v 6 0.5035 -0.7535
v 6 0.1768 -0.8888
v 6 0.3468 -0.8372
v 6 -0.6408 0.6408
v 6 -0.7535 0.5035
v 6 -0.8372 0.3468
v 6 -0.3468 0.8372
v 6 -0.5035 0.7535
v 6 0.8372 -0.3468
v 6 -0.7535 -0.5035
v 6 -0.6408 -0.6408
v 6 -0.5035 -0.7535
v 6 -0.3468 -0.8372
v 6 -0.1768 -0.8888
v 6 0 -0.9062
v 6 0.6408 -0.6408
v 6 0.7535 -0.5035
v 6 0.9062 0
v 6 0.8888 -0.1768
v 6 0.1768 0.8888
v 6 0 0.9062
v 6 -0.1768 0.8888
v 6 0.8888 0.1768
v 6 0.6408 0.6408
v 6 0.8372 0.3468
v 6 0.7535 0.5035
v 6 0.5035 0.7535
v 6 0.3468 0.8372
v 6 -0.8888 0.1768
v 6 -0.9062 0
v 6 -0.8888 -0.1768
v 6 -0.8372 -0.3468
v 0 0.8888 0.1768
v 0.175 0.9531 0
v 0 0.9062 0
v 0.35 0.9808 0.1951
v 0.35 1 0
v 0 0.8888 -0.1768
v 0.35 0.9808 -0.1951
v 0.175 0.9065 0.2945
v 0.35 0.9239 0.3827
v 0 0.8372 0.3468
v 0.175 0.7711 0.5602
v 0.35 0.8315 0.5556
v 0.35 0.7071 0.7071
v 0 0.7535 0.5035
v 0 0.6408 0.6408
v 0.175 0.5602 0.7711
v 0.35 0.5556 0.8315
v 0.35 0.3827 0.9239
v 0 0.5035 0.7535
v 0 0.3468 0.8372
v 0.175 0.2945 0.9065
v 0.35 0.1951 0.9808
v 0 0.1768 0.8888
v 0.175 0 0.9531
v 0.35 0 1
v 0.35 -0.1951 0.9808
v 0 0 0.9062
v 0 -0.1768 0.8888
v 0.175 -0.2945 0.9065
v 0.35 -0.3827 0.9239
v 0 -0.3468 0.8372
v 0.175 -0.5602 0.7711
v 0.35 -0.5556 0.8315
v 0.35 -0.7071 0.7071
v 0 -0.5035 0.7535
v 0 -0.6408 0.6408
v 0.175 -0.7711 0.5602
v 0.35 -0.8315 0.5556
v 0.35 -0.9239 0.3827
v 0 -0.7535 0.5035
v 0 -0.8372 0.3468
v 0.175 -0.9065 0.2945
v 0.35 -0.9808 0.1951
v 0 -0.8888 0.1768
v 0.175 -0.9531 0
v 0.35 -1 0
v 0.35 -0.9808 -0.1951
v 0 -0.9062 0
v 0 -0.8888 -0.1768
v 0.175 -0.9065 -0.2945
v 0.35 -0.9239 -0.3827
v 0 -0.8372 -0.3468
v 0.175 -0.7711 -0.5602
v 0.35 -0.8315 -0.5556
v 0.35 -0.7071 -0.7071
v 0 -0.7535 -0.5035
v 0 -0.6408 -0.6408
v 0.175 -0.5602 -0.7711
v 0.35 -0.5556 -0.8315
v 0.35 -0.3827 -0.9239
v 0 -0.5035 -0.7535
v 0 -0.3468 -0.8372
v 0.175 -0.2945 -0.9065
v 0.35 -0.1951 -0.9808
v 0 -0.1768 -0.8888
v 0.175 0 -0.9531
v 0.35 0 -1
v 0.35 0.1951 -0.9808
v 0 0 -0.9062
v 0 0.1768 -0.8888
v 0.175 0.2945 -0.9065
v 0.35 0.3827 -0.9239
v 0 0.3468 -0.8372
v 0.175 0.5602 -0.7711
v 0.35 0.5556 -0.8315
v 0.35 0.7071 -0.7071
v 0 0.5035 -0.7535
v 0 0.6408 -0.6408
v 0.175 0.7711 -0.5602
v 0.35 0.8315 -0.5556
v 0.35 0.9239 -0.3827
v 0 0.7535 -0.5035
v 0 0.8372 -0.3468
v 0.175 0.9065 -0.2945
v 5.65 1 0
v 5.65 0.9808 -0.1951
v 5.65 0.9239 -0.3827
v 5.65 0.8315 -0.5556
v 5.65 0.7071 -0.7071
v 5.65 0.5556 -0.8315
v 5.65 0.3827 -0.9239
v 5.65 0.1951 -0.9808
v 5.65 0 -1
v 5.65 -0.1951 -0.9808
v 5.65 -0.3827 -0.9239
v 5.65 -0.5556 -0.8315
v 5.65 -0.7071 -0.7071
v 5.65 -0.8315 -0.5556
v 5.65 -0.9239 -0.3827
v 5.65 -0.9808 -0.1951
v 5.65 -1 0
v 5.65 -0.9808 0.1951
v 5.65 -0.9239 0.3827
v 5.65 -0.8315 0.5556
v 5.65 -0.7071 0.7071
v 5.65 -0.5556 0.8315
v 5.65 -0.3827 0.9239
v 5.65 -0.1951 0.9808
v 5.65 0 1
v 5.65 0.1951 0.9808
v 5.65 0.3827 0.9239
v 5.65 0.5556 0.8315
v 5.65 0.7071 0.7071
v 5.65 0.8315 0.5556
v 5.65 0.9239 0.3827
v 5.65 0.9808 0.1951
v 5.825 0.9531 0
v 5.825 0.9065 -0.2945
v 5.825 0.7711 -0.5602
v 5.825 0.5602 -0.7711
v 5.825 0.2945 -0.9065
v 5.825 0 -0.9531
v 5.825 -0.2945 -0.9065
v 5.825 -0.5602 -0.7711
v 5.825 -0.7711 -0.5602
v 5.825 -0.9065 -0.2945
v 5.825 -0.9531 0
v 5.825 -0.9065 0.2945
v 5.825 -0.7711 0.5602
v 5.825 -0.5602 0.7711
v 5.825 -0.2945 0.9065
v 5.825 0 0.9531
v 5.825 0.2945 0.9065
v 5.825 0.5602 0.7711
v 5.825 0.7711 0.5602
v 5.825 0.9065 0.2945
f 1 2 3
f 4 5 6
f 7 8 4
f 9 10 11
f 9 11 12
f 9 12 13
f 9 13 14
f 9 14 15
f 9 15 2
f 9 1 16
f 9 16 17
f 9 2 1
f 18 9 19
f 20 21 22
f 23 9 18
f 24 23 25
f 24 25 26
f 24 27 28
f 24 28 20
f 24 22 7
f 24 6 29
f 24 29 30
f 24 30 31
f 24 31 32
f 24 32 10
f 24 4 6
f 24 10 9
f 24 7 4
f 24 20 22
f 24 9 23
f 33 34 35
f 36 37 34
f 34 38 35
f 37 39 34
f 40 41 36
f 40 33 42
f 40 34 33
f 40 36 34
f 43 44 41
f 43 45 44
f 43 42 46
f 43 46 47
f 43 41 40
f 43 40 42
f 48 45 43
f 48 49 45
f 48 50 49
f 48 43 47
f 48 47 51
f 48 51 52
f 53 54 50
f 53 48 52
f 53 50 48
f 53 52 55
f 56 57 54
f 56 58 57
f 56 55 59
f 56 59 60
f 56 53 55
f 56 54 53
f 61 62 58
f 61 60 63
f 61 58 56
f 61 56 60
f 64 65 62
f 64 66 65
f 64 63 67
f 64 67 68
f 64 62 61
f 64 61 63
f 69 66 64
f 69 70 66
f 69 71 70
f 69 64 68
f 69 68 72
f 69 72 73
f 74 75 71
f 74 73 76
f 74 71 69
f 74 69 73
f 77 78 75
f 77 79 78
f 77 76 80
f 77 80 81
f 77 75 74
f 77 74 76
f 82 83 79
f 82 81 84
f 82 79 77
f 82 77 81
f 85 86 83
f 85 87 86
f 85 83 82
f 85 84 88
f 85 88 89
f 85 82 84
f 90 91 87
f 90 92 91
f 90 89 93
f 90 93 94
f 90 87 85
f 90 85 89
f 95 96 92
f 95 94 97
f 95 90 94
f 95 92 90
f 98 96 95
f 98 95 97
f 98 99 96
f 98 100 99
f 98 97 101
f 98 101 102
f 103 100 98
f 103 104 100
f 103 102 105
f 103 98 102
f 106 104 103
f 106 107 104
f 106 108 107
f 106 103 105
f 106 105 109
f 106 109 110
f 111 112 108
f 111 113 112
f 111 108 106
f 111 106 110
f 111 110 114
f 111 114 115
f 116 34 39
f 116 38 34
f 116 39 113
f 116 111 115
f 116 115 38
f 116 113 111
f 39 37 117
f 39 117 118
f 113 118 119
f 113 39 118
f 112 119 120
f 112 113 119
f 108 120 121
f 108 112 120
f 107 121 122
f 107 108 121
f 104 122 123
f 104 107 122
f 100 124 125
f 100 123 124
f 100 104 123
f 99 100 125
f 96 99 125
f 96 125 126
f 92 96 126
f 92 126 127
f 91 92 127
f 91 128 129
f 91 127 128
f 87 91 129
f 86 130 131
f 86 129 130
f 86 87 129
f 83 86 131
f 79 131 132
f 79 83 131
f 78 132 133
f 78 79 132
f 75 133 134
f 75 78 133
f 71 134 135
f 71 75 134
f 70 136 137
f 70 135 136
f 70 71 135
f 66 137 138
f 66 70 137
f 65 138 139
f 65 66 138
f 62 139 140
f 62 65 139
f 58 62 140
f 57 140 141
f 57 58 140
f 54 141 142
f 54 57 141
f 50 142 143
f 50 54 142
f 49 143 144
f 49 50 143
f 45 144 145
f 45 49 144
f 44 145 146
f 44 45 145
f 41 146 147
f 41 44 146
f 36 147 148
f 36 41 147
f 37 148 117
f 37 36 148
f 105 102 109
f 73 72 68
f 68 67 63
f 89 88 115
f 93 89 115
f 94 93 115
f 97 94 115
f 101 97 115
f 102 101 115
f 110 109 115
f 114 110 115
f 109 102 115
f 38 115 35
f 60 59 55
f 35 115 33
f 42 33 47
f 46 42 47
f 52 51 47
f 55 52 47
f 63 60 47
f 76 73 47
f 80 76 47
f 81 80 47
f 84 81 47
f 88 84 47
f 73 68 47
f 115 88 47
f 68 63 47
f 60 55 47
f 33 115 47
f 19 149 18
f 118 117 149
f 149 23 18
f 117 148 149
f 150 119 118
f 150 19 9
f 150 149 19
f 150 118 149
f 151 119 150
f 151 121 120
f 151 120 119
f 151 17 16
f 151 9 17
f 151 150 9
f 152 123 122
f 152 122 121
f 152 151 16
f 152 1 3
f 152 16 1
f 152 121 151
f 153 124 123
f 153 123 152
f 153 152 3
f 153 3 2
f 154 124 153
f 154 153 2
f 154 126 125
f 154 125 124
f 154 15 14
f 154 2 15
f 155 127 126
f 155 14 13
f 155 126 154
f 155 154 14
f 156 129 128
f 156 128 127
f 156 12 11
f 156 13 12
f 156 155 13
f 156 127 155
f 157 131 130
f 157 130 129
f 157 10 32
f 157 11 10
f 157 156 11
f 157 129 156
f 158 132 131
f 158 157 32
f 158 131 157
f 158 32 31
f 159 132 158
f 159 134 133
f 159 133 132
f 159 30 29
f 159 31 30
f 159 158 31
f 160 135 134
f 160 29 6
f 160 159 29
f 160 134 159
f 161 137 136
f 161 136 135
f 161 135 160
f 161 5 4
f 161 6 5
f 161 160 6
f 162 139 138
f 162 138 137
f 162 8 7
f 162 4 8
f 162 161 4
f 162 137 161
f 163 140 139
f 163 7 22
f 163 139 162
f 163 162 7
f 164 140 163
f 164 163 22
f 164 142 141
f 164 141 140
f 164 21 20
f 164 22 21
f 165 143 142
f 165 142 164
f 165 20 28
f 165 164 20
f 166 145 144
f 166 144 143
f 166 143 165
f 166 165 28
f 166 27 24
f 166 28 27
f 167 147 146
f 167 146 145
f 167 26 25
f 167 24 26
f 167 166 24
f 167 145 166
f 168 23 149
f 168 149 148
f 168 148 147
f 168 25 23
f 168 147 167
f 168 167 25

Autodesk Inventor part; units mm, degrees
ref_plane "YZ Plane" through (0, 0, 0) normal (1, 0, 0) x (0, 1, 0)
ref_plane "XZ Plane" through (0, 0, 0) normal (0, 1, 0) x (-1, 0, 0)
ref_plane "XY Plane" through (0, 0, 0) normal (0, 0, 1) x (1, 0, 0)
sketch "Skizze" plane through (0, 0, 0) normal (1, 0, 0) x (0, 1, 0)
  circle A0 centre (0, 0) radius 1
  dimension "d1" = 2
extrude "Körper" add sketch "Skizze" along normal blind 6
chamfer "Fase1" distance 0.35 angle 15 1 edges at (0, -1, 0) measured on face at (4, 0.9871, -0.1604)
chamfer "Skizze2" distance 0.35 angle 15 1 edges at (6, -1, 0) measured on face at (4.1167, 0.9968, -0.0805)
equation "\"d1\" = NND"
equation "\"d2\" = NLG"
equation "\"d8\" = PHH"
equation "\"d9\" = FAWI"
equation "\"d12\" = PHH"
equation "\"d4\" = PHH"
equation "\"d5\" = FAWI"
equation "\"d11\" = PHH"
equation "\"NND\" = 2"
equation "\"NLG\" = 6"
equation "\"PHH\" = 0.35"
equation "\"FAWI\" = 15deg"
equation "\"KAH\" = 0"
properties part number "ISO 2338 - 2 m6 x 6" material "Edelstahl, austenitisch"
